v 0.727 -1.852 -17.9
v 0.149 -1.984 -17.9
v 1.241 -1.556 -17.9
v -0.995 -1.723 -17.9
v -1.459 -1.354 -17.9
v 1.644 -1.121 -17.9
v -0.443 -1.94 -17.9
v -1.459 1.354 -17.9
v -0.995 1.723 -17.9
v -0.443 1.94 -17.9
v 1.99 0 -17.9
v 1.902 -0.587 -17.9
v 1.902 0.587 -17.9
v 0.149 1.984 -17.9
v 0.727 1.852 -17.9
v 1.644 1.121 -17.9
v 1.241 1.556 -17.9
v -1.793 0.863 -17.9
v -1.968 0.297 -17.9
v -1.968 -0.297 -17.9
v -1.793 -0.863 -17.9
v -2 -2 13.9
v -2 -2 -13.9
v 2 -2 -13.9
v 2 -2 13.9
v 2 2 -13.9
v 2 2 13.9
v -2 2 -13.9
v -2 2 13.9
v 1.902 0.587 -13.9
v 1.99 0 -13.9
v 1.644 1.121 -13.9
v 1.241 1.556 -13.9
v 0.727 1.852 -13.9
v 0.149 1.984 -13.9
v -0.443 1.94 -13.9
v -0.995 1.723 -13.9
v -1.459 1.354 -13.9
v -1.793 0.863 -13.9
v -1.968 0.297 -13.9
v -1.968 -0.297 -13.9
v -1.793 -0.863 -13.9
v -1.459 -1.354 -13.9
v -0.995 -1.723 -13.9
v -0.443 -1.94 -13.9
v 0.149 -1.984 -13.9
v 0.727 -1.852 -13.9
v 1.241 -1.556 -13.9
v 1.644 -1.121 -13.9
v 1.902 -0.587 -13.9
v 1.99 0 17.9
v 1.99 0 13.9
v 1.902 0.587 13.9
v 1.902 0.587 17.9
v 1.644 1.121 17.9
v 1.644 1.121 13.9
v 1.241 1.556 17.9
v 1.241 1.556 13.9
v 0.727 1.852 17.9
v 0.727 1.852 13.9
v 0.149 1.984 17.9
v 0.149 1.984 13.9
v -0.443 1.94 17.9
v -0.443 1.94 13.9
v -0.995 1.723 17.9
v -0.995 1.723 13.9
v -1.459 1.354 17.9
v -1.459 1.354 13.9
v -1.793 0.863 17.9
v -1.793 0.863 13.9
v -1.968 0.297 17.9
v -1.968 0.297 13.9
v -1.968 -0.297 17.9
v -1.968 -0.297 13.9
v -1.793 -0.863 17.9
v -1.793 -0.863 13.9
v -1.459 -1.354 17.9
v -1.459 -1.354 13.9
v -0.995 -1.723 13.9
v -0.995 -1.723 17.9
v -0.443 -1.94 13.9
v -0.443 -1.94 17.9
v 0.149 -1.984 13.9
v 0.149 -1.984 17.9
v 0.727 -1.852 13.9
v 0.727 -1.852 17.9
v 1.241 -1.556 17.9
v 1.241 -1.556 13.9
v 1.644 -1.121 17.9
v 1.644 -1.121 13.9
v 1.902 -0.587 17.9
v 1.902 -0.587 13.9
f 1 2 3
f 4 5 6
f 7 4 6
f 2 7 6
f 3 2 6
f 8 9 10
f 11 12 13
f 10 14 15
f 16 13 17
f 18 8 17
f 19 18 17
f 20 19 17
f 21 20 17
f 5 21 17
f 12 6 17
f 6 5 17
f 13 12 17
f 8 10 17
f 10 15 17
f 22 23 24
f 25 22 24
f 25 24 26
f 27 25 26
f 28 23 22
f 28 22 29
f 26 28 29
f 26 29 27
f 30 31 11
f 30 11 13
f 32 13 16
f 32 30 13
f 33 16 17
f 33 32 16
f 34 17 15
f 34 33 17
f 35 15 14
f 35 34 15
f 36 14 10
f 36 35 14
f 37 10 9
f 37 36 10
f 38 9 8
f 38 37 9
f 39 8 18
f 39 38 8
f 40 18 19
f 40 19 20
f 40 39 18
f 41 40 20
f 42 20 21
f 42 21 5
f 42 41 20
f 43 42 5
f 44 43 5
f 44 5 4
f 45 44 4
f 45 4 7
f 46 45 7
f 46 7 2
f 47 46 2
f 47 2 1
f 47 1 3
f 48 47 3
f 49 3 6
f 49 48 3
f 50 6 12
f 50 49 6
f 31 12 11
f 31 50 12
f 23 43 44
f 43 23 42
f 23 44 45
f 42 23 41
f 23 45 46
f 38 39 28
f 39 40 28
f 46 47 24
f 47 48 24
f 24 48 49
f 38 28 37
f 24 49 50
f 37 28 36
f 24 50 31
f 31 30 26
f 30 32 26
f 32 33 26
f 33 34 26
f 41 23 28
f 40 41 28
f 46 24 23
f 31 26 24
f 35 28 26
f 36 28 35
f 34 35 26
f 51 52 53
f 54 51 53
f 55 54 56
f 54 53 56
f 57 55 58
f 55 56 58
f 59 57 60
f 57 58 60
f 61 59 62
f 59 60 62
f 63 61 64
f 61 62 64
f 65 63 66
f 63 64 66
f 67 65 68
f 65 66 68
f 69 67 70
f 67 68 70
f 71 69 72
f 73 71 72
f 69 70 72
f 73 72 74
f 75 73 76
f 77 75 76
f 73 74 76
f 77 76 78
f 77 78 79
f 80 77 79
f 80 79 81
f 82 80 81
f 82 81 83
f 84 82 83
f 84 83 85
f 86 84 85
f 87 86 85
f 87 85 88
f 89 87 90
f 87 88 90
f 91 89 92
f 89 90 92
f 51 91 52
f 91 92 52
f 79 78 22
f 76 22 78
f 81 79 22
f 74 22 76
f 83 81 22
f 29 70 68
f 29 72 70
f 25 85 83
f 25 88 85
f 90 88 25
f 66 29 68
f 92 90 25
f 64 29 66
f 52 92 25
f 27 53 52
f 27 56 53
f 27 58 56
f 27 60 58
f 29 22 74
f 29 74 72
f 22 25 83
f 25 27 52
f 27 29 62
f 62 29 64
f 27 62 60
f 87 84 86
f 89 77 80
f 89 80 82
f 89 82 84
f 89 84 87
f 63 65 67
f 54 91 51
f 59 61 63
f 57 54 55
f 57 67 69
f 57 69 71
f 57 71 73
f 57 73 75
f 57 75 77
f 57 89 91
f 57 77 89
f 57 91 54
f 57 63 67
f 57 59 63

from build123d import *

# Parameters (mm, degrees)
SKETCH1_W           = 4
SKETCH1_H           = 4
BOSS_EXTRUDE1_DEPTH = 13.9
SKETCH2_R           = 1.99
BOSS_EXTRUDE2_DEPTH = 4


with BuildPart() as part:
    # Sketch1 → Boss-Extrude1 (new, symmetric)
    with BuildSketch(Plane.XY):
        Rectangle(SKETCH1_W, SKETCH1_H)
    extrude(amount=BOSS_EXTRUDE1_DEPTH, both=True)

    # Sketch2 → Boss-Extrude2 (add)
    with BuildSketch(Plane.XY.offset(13.9)):
        Circle(SKETCH2_R)
    boss_extrude2 = extrude(amount=BOSS_EXTRUDE2_DEPTH)

    # Mirror2: Boss-Extrude2 across plane
    add(boss_extrude2.mirror(Plane.XY))


solid = part.part
